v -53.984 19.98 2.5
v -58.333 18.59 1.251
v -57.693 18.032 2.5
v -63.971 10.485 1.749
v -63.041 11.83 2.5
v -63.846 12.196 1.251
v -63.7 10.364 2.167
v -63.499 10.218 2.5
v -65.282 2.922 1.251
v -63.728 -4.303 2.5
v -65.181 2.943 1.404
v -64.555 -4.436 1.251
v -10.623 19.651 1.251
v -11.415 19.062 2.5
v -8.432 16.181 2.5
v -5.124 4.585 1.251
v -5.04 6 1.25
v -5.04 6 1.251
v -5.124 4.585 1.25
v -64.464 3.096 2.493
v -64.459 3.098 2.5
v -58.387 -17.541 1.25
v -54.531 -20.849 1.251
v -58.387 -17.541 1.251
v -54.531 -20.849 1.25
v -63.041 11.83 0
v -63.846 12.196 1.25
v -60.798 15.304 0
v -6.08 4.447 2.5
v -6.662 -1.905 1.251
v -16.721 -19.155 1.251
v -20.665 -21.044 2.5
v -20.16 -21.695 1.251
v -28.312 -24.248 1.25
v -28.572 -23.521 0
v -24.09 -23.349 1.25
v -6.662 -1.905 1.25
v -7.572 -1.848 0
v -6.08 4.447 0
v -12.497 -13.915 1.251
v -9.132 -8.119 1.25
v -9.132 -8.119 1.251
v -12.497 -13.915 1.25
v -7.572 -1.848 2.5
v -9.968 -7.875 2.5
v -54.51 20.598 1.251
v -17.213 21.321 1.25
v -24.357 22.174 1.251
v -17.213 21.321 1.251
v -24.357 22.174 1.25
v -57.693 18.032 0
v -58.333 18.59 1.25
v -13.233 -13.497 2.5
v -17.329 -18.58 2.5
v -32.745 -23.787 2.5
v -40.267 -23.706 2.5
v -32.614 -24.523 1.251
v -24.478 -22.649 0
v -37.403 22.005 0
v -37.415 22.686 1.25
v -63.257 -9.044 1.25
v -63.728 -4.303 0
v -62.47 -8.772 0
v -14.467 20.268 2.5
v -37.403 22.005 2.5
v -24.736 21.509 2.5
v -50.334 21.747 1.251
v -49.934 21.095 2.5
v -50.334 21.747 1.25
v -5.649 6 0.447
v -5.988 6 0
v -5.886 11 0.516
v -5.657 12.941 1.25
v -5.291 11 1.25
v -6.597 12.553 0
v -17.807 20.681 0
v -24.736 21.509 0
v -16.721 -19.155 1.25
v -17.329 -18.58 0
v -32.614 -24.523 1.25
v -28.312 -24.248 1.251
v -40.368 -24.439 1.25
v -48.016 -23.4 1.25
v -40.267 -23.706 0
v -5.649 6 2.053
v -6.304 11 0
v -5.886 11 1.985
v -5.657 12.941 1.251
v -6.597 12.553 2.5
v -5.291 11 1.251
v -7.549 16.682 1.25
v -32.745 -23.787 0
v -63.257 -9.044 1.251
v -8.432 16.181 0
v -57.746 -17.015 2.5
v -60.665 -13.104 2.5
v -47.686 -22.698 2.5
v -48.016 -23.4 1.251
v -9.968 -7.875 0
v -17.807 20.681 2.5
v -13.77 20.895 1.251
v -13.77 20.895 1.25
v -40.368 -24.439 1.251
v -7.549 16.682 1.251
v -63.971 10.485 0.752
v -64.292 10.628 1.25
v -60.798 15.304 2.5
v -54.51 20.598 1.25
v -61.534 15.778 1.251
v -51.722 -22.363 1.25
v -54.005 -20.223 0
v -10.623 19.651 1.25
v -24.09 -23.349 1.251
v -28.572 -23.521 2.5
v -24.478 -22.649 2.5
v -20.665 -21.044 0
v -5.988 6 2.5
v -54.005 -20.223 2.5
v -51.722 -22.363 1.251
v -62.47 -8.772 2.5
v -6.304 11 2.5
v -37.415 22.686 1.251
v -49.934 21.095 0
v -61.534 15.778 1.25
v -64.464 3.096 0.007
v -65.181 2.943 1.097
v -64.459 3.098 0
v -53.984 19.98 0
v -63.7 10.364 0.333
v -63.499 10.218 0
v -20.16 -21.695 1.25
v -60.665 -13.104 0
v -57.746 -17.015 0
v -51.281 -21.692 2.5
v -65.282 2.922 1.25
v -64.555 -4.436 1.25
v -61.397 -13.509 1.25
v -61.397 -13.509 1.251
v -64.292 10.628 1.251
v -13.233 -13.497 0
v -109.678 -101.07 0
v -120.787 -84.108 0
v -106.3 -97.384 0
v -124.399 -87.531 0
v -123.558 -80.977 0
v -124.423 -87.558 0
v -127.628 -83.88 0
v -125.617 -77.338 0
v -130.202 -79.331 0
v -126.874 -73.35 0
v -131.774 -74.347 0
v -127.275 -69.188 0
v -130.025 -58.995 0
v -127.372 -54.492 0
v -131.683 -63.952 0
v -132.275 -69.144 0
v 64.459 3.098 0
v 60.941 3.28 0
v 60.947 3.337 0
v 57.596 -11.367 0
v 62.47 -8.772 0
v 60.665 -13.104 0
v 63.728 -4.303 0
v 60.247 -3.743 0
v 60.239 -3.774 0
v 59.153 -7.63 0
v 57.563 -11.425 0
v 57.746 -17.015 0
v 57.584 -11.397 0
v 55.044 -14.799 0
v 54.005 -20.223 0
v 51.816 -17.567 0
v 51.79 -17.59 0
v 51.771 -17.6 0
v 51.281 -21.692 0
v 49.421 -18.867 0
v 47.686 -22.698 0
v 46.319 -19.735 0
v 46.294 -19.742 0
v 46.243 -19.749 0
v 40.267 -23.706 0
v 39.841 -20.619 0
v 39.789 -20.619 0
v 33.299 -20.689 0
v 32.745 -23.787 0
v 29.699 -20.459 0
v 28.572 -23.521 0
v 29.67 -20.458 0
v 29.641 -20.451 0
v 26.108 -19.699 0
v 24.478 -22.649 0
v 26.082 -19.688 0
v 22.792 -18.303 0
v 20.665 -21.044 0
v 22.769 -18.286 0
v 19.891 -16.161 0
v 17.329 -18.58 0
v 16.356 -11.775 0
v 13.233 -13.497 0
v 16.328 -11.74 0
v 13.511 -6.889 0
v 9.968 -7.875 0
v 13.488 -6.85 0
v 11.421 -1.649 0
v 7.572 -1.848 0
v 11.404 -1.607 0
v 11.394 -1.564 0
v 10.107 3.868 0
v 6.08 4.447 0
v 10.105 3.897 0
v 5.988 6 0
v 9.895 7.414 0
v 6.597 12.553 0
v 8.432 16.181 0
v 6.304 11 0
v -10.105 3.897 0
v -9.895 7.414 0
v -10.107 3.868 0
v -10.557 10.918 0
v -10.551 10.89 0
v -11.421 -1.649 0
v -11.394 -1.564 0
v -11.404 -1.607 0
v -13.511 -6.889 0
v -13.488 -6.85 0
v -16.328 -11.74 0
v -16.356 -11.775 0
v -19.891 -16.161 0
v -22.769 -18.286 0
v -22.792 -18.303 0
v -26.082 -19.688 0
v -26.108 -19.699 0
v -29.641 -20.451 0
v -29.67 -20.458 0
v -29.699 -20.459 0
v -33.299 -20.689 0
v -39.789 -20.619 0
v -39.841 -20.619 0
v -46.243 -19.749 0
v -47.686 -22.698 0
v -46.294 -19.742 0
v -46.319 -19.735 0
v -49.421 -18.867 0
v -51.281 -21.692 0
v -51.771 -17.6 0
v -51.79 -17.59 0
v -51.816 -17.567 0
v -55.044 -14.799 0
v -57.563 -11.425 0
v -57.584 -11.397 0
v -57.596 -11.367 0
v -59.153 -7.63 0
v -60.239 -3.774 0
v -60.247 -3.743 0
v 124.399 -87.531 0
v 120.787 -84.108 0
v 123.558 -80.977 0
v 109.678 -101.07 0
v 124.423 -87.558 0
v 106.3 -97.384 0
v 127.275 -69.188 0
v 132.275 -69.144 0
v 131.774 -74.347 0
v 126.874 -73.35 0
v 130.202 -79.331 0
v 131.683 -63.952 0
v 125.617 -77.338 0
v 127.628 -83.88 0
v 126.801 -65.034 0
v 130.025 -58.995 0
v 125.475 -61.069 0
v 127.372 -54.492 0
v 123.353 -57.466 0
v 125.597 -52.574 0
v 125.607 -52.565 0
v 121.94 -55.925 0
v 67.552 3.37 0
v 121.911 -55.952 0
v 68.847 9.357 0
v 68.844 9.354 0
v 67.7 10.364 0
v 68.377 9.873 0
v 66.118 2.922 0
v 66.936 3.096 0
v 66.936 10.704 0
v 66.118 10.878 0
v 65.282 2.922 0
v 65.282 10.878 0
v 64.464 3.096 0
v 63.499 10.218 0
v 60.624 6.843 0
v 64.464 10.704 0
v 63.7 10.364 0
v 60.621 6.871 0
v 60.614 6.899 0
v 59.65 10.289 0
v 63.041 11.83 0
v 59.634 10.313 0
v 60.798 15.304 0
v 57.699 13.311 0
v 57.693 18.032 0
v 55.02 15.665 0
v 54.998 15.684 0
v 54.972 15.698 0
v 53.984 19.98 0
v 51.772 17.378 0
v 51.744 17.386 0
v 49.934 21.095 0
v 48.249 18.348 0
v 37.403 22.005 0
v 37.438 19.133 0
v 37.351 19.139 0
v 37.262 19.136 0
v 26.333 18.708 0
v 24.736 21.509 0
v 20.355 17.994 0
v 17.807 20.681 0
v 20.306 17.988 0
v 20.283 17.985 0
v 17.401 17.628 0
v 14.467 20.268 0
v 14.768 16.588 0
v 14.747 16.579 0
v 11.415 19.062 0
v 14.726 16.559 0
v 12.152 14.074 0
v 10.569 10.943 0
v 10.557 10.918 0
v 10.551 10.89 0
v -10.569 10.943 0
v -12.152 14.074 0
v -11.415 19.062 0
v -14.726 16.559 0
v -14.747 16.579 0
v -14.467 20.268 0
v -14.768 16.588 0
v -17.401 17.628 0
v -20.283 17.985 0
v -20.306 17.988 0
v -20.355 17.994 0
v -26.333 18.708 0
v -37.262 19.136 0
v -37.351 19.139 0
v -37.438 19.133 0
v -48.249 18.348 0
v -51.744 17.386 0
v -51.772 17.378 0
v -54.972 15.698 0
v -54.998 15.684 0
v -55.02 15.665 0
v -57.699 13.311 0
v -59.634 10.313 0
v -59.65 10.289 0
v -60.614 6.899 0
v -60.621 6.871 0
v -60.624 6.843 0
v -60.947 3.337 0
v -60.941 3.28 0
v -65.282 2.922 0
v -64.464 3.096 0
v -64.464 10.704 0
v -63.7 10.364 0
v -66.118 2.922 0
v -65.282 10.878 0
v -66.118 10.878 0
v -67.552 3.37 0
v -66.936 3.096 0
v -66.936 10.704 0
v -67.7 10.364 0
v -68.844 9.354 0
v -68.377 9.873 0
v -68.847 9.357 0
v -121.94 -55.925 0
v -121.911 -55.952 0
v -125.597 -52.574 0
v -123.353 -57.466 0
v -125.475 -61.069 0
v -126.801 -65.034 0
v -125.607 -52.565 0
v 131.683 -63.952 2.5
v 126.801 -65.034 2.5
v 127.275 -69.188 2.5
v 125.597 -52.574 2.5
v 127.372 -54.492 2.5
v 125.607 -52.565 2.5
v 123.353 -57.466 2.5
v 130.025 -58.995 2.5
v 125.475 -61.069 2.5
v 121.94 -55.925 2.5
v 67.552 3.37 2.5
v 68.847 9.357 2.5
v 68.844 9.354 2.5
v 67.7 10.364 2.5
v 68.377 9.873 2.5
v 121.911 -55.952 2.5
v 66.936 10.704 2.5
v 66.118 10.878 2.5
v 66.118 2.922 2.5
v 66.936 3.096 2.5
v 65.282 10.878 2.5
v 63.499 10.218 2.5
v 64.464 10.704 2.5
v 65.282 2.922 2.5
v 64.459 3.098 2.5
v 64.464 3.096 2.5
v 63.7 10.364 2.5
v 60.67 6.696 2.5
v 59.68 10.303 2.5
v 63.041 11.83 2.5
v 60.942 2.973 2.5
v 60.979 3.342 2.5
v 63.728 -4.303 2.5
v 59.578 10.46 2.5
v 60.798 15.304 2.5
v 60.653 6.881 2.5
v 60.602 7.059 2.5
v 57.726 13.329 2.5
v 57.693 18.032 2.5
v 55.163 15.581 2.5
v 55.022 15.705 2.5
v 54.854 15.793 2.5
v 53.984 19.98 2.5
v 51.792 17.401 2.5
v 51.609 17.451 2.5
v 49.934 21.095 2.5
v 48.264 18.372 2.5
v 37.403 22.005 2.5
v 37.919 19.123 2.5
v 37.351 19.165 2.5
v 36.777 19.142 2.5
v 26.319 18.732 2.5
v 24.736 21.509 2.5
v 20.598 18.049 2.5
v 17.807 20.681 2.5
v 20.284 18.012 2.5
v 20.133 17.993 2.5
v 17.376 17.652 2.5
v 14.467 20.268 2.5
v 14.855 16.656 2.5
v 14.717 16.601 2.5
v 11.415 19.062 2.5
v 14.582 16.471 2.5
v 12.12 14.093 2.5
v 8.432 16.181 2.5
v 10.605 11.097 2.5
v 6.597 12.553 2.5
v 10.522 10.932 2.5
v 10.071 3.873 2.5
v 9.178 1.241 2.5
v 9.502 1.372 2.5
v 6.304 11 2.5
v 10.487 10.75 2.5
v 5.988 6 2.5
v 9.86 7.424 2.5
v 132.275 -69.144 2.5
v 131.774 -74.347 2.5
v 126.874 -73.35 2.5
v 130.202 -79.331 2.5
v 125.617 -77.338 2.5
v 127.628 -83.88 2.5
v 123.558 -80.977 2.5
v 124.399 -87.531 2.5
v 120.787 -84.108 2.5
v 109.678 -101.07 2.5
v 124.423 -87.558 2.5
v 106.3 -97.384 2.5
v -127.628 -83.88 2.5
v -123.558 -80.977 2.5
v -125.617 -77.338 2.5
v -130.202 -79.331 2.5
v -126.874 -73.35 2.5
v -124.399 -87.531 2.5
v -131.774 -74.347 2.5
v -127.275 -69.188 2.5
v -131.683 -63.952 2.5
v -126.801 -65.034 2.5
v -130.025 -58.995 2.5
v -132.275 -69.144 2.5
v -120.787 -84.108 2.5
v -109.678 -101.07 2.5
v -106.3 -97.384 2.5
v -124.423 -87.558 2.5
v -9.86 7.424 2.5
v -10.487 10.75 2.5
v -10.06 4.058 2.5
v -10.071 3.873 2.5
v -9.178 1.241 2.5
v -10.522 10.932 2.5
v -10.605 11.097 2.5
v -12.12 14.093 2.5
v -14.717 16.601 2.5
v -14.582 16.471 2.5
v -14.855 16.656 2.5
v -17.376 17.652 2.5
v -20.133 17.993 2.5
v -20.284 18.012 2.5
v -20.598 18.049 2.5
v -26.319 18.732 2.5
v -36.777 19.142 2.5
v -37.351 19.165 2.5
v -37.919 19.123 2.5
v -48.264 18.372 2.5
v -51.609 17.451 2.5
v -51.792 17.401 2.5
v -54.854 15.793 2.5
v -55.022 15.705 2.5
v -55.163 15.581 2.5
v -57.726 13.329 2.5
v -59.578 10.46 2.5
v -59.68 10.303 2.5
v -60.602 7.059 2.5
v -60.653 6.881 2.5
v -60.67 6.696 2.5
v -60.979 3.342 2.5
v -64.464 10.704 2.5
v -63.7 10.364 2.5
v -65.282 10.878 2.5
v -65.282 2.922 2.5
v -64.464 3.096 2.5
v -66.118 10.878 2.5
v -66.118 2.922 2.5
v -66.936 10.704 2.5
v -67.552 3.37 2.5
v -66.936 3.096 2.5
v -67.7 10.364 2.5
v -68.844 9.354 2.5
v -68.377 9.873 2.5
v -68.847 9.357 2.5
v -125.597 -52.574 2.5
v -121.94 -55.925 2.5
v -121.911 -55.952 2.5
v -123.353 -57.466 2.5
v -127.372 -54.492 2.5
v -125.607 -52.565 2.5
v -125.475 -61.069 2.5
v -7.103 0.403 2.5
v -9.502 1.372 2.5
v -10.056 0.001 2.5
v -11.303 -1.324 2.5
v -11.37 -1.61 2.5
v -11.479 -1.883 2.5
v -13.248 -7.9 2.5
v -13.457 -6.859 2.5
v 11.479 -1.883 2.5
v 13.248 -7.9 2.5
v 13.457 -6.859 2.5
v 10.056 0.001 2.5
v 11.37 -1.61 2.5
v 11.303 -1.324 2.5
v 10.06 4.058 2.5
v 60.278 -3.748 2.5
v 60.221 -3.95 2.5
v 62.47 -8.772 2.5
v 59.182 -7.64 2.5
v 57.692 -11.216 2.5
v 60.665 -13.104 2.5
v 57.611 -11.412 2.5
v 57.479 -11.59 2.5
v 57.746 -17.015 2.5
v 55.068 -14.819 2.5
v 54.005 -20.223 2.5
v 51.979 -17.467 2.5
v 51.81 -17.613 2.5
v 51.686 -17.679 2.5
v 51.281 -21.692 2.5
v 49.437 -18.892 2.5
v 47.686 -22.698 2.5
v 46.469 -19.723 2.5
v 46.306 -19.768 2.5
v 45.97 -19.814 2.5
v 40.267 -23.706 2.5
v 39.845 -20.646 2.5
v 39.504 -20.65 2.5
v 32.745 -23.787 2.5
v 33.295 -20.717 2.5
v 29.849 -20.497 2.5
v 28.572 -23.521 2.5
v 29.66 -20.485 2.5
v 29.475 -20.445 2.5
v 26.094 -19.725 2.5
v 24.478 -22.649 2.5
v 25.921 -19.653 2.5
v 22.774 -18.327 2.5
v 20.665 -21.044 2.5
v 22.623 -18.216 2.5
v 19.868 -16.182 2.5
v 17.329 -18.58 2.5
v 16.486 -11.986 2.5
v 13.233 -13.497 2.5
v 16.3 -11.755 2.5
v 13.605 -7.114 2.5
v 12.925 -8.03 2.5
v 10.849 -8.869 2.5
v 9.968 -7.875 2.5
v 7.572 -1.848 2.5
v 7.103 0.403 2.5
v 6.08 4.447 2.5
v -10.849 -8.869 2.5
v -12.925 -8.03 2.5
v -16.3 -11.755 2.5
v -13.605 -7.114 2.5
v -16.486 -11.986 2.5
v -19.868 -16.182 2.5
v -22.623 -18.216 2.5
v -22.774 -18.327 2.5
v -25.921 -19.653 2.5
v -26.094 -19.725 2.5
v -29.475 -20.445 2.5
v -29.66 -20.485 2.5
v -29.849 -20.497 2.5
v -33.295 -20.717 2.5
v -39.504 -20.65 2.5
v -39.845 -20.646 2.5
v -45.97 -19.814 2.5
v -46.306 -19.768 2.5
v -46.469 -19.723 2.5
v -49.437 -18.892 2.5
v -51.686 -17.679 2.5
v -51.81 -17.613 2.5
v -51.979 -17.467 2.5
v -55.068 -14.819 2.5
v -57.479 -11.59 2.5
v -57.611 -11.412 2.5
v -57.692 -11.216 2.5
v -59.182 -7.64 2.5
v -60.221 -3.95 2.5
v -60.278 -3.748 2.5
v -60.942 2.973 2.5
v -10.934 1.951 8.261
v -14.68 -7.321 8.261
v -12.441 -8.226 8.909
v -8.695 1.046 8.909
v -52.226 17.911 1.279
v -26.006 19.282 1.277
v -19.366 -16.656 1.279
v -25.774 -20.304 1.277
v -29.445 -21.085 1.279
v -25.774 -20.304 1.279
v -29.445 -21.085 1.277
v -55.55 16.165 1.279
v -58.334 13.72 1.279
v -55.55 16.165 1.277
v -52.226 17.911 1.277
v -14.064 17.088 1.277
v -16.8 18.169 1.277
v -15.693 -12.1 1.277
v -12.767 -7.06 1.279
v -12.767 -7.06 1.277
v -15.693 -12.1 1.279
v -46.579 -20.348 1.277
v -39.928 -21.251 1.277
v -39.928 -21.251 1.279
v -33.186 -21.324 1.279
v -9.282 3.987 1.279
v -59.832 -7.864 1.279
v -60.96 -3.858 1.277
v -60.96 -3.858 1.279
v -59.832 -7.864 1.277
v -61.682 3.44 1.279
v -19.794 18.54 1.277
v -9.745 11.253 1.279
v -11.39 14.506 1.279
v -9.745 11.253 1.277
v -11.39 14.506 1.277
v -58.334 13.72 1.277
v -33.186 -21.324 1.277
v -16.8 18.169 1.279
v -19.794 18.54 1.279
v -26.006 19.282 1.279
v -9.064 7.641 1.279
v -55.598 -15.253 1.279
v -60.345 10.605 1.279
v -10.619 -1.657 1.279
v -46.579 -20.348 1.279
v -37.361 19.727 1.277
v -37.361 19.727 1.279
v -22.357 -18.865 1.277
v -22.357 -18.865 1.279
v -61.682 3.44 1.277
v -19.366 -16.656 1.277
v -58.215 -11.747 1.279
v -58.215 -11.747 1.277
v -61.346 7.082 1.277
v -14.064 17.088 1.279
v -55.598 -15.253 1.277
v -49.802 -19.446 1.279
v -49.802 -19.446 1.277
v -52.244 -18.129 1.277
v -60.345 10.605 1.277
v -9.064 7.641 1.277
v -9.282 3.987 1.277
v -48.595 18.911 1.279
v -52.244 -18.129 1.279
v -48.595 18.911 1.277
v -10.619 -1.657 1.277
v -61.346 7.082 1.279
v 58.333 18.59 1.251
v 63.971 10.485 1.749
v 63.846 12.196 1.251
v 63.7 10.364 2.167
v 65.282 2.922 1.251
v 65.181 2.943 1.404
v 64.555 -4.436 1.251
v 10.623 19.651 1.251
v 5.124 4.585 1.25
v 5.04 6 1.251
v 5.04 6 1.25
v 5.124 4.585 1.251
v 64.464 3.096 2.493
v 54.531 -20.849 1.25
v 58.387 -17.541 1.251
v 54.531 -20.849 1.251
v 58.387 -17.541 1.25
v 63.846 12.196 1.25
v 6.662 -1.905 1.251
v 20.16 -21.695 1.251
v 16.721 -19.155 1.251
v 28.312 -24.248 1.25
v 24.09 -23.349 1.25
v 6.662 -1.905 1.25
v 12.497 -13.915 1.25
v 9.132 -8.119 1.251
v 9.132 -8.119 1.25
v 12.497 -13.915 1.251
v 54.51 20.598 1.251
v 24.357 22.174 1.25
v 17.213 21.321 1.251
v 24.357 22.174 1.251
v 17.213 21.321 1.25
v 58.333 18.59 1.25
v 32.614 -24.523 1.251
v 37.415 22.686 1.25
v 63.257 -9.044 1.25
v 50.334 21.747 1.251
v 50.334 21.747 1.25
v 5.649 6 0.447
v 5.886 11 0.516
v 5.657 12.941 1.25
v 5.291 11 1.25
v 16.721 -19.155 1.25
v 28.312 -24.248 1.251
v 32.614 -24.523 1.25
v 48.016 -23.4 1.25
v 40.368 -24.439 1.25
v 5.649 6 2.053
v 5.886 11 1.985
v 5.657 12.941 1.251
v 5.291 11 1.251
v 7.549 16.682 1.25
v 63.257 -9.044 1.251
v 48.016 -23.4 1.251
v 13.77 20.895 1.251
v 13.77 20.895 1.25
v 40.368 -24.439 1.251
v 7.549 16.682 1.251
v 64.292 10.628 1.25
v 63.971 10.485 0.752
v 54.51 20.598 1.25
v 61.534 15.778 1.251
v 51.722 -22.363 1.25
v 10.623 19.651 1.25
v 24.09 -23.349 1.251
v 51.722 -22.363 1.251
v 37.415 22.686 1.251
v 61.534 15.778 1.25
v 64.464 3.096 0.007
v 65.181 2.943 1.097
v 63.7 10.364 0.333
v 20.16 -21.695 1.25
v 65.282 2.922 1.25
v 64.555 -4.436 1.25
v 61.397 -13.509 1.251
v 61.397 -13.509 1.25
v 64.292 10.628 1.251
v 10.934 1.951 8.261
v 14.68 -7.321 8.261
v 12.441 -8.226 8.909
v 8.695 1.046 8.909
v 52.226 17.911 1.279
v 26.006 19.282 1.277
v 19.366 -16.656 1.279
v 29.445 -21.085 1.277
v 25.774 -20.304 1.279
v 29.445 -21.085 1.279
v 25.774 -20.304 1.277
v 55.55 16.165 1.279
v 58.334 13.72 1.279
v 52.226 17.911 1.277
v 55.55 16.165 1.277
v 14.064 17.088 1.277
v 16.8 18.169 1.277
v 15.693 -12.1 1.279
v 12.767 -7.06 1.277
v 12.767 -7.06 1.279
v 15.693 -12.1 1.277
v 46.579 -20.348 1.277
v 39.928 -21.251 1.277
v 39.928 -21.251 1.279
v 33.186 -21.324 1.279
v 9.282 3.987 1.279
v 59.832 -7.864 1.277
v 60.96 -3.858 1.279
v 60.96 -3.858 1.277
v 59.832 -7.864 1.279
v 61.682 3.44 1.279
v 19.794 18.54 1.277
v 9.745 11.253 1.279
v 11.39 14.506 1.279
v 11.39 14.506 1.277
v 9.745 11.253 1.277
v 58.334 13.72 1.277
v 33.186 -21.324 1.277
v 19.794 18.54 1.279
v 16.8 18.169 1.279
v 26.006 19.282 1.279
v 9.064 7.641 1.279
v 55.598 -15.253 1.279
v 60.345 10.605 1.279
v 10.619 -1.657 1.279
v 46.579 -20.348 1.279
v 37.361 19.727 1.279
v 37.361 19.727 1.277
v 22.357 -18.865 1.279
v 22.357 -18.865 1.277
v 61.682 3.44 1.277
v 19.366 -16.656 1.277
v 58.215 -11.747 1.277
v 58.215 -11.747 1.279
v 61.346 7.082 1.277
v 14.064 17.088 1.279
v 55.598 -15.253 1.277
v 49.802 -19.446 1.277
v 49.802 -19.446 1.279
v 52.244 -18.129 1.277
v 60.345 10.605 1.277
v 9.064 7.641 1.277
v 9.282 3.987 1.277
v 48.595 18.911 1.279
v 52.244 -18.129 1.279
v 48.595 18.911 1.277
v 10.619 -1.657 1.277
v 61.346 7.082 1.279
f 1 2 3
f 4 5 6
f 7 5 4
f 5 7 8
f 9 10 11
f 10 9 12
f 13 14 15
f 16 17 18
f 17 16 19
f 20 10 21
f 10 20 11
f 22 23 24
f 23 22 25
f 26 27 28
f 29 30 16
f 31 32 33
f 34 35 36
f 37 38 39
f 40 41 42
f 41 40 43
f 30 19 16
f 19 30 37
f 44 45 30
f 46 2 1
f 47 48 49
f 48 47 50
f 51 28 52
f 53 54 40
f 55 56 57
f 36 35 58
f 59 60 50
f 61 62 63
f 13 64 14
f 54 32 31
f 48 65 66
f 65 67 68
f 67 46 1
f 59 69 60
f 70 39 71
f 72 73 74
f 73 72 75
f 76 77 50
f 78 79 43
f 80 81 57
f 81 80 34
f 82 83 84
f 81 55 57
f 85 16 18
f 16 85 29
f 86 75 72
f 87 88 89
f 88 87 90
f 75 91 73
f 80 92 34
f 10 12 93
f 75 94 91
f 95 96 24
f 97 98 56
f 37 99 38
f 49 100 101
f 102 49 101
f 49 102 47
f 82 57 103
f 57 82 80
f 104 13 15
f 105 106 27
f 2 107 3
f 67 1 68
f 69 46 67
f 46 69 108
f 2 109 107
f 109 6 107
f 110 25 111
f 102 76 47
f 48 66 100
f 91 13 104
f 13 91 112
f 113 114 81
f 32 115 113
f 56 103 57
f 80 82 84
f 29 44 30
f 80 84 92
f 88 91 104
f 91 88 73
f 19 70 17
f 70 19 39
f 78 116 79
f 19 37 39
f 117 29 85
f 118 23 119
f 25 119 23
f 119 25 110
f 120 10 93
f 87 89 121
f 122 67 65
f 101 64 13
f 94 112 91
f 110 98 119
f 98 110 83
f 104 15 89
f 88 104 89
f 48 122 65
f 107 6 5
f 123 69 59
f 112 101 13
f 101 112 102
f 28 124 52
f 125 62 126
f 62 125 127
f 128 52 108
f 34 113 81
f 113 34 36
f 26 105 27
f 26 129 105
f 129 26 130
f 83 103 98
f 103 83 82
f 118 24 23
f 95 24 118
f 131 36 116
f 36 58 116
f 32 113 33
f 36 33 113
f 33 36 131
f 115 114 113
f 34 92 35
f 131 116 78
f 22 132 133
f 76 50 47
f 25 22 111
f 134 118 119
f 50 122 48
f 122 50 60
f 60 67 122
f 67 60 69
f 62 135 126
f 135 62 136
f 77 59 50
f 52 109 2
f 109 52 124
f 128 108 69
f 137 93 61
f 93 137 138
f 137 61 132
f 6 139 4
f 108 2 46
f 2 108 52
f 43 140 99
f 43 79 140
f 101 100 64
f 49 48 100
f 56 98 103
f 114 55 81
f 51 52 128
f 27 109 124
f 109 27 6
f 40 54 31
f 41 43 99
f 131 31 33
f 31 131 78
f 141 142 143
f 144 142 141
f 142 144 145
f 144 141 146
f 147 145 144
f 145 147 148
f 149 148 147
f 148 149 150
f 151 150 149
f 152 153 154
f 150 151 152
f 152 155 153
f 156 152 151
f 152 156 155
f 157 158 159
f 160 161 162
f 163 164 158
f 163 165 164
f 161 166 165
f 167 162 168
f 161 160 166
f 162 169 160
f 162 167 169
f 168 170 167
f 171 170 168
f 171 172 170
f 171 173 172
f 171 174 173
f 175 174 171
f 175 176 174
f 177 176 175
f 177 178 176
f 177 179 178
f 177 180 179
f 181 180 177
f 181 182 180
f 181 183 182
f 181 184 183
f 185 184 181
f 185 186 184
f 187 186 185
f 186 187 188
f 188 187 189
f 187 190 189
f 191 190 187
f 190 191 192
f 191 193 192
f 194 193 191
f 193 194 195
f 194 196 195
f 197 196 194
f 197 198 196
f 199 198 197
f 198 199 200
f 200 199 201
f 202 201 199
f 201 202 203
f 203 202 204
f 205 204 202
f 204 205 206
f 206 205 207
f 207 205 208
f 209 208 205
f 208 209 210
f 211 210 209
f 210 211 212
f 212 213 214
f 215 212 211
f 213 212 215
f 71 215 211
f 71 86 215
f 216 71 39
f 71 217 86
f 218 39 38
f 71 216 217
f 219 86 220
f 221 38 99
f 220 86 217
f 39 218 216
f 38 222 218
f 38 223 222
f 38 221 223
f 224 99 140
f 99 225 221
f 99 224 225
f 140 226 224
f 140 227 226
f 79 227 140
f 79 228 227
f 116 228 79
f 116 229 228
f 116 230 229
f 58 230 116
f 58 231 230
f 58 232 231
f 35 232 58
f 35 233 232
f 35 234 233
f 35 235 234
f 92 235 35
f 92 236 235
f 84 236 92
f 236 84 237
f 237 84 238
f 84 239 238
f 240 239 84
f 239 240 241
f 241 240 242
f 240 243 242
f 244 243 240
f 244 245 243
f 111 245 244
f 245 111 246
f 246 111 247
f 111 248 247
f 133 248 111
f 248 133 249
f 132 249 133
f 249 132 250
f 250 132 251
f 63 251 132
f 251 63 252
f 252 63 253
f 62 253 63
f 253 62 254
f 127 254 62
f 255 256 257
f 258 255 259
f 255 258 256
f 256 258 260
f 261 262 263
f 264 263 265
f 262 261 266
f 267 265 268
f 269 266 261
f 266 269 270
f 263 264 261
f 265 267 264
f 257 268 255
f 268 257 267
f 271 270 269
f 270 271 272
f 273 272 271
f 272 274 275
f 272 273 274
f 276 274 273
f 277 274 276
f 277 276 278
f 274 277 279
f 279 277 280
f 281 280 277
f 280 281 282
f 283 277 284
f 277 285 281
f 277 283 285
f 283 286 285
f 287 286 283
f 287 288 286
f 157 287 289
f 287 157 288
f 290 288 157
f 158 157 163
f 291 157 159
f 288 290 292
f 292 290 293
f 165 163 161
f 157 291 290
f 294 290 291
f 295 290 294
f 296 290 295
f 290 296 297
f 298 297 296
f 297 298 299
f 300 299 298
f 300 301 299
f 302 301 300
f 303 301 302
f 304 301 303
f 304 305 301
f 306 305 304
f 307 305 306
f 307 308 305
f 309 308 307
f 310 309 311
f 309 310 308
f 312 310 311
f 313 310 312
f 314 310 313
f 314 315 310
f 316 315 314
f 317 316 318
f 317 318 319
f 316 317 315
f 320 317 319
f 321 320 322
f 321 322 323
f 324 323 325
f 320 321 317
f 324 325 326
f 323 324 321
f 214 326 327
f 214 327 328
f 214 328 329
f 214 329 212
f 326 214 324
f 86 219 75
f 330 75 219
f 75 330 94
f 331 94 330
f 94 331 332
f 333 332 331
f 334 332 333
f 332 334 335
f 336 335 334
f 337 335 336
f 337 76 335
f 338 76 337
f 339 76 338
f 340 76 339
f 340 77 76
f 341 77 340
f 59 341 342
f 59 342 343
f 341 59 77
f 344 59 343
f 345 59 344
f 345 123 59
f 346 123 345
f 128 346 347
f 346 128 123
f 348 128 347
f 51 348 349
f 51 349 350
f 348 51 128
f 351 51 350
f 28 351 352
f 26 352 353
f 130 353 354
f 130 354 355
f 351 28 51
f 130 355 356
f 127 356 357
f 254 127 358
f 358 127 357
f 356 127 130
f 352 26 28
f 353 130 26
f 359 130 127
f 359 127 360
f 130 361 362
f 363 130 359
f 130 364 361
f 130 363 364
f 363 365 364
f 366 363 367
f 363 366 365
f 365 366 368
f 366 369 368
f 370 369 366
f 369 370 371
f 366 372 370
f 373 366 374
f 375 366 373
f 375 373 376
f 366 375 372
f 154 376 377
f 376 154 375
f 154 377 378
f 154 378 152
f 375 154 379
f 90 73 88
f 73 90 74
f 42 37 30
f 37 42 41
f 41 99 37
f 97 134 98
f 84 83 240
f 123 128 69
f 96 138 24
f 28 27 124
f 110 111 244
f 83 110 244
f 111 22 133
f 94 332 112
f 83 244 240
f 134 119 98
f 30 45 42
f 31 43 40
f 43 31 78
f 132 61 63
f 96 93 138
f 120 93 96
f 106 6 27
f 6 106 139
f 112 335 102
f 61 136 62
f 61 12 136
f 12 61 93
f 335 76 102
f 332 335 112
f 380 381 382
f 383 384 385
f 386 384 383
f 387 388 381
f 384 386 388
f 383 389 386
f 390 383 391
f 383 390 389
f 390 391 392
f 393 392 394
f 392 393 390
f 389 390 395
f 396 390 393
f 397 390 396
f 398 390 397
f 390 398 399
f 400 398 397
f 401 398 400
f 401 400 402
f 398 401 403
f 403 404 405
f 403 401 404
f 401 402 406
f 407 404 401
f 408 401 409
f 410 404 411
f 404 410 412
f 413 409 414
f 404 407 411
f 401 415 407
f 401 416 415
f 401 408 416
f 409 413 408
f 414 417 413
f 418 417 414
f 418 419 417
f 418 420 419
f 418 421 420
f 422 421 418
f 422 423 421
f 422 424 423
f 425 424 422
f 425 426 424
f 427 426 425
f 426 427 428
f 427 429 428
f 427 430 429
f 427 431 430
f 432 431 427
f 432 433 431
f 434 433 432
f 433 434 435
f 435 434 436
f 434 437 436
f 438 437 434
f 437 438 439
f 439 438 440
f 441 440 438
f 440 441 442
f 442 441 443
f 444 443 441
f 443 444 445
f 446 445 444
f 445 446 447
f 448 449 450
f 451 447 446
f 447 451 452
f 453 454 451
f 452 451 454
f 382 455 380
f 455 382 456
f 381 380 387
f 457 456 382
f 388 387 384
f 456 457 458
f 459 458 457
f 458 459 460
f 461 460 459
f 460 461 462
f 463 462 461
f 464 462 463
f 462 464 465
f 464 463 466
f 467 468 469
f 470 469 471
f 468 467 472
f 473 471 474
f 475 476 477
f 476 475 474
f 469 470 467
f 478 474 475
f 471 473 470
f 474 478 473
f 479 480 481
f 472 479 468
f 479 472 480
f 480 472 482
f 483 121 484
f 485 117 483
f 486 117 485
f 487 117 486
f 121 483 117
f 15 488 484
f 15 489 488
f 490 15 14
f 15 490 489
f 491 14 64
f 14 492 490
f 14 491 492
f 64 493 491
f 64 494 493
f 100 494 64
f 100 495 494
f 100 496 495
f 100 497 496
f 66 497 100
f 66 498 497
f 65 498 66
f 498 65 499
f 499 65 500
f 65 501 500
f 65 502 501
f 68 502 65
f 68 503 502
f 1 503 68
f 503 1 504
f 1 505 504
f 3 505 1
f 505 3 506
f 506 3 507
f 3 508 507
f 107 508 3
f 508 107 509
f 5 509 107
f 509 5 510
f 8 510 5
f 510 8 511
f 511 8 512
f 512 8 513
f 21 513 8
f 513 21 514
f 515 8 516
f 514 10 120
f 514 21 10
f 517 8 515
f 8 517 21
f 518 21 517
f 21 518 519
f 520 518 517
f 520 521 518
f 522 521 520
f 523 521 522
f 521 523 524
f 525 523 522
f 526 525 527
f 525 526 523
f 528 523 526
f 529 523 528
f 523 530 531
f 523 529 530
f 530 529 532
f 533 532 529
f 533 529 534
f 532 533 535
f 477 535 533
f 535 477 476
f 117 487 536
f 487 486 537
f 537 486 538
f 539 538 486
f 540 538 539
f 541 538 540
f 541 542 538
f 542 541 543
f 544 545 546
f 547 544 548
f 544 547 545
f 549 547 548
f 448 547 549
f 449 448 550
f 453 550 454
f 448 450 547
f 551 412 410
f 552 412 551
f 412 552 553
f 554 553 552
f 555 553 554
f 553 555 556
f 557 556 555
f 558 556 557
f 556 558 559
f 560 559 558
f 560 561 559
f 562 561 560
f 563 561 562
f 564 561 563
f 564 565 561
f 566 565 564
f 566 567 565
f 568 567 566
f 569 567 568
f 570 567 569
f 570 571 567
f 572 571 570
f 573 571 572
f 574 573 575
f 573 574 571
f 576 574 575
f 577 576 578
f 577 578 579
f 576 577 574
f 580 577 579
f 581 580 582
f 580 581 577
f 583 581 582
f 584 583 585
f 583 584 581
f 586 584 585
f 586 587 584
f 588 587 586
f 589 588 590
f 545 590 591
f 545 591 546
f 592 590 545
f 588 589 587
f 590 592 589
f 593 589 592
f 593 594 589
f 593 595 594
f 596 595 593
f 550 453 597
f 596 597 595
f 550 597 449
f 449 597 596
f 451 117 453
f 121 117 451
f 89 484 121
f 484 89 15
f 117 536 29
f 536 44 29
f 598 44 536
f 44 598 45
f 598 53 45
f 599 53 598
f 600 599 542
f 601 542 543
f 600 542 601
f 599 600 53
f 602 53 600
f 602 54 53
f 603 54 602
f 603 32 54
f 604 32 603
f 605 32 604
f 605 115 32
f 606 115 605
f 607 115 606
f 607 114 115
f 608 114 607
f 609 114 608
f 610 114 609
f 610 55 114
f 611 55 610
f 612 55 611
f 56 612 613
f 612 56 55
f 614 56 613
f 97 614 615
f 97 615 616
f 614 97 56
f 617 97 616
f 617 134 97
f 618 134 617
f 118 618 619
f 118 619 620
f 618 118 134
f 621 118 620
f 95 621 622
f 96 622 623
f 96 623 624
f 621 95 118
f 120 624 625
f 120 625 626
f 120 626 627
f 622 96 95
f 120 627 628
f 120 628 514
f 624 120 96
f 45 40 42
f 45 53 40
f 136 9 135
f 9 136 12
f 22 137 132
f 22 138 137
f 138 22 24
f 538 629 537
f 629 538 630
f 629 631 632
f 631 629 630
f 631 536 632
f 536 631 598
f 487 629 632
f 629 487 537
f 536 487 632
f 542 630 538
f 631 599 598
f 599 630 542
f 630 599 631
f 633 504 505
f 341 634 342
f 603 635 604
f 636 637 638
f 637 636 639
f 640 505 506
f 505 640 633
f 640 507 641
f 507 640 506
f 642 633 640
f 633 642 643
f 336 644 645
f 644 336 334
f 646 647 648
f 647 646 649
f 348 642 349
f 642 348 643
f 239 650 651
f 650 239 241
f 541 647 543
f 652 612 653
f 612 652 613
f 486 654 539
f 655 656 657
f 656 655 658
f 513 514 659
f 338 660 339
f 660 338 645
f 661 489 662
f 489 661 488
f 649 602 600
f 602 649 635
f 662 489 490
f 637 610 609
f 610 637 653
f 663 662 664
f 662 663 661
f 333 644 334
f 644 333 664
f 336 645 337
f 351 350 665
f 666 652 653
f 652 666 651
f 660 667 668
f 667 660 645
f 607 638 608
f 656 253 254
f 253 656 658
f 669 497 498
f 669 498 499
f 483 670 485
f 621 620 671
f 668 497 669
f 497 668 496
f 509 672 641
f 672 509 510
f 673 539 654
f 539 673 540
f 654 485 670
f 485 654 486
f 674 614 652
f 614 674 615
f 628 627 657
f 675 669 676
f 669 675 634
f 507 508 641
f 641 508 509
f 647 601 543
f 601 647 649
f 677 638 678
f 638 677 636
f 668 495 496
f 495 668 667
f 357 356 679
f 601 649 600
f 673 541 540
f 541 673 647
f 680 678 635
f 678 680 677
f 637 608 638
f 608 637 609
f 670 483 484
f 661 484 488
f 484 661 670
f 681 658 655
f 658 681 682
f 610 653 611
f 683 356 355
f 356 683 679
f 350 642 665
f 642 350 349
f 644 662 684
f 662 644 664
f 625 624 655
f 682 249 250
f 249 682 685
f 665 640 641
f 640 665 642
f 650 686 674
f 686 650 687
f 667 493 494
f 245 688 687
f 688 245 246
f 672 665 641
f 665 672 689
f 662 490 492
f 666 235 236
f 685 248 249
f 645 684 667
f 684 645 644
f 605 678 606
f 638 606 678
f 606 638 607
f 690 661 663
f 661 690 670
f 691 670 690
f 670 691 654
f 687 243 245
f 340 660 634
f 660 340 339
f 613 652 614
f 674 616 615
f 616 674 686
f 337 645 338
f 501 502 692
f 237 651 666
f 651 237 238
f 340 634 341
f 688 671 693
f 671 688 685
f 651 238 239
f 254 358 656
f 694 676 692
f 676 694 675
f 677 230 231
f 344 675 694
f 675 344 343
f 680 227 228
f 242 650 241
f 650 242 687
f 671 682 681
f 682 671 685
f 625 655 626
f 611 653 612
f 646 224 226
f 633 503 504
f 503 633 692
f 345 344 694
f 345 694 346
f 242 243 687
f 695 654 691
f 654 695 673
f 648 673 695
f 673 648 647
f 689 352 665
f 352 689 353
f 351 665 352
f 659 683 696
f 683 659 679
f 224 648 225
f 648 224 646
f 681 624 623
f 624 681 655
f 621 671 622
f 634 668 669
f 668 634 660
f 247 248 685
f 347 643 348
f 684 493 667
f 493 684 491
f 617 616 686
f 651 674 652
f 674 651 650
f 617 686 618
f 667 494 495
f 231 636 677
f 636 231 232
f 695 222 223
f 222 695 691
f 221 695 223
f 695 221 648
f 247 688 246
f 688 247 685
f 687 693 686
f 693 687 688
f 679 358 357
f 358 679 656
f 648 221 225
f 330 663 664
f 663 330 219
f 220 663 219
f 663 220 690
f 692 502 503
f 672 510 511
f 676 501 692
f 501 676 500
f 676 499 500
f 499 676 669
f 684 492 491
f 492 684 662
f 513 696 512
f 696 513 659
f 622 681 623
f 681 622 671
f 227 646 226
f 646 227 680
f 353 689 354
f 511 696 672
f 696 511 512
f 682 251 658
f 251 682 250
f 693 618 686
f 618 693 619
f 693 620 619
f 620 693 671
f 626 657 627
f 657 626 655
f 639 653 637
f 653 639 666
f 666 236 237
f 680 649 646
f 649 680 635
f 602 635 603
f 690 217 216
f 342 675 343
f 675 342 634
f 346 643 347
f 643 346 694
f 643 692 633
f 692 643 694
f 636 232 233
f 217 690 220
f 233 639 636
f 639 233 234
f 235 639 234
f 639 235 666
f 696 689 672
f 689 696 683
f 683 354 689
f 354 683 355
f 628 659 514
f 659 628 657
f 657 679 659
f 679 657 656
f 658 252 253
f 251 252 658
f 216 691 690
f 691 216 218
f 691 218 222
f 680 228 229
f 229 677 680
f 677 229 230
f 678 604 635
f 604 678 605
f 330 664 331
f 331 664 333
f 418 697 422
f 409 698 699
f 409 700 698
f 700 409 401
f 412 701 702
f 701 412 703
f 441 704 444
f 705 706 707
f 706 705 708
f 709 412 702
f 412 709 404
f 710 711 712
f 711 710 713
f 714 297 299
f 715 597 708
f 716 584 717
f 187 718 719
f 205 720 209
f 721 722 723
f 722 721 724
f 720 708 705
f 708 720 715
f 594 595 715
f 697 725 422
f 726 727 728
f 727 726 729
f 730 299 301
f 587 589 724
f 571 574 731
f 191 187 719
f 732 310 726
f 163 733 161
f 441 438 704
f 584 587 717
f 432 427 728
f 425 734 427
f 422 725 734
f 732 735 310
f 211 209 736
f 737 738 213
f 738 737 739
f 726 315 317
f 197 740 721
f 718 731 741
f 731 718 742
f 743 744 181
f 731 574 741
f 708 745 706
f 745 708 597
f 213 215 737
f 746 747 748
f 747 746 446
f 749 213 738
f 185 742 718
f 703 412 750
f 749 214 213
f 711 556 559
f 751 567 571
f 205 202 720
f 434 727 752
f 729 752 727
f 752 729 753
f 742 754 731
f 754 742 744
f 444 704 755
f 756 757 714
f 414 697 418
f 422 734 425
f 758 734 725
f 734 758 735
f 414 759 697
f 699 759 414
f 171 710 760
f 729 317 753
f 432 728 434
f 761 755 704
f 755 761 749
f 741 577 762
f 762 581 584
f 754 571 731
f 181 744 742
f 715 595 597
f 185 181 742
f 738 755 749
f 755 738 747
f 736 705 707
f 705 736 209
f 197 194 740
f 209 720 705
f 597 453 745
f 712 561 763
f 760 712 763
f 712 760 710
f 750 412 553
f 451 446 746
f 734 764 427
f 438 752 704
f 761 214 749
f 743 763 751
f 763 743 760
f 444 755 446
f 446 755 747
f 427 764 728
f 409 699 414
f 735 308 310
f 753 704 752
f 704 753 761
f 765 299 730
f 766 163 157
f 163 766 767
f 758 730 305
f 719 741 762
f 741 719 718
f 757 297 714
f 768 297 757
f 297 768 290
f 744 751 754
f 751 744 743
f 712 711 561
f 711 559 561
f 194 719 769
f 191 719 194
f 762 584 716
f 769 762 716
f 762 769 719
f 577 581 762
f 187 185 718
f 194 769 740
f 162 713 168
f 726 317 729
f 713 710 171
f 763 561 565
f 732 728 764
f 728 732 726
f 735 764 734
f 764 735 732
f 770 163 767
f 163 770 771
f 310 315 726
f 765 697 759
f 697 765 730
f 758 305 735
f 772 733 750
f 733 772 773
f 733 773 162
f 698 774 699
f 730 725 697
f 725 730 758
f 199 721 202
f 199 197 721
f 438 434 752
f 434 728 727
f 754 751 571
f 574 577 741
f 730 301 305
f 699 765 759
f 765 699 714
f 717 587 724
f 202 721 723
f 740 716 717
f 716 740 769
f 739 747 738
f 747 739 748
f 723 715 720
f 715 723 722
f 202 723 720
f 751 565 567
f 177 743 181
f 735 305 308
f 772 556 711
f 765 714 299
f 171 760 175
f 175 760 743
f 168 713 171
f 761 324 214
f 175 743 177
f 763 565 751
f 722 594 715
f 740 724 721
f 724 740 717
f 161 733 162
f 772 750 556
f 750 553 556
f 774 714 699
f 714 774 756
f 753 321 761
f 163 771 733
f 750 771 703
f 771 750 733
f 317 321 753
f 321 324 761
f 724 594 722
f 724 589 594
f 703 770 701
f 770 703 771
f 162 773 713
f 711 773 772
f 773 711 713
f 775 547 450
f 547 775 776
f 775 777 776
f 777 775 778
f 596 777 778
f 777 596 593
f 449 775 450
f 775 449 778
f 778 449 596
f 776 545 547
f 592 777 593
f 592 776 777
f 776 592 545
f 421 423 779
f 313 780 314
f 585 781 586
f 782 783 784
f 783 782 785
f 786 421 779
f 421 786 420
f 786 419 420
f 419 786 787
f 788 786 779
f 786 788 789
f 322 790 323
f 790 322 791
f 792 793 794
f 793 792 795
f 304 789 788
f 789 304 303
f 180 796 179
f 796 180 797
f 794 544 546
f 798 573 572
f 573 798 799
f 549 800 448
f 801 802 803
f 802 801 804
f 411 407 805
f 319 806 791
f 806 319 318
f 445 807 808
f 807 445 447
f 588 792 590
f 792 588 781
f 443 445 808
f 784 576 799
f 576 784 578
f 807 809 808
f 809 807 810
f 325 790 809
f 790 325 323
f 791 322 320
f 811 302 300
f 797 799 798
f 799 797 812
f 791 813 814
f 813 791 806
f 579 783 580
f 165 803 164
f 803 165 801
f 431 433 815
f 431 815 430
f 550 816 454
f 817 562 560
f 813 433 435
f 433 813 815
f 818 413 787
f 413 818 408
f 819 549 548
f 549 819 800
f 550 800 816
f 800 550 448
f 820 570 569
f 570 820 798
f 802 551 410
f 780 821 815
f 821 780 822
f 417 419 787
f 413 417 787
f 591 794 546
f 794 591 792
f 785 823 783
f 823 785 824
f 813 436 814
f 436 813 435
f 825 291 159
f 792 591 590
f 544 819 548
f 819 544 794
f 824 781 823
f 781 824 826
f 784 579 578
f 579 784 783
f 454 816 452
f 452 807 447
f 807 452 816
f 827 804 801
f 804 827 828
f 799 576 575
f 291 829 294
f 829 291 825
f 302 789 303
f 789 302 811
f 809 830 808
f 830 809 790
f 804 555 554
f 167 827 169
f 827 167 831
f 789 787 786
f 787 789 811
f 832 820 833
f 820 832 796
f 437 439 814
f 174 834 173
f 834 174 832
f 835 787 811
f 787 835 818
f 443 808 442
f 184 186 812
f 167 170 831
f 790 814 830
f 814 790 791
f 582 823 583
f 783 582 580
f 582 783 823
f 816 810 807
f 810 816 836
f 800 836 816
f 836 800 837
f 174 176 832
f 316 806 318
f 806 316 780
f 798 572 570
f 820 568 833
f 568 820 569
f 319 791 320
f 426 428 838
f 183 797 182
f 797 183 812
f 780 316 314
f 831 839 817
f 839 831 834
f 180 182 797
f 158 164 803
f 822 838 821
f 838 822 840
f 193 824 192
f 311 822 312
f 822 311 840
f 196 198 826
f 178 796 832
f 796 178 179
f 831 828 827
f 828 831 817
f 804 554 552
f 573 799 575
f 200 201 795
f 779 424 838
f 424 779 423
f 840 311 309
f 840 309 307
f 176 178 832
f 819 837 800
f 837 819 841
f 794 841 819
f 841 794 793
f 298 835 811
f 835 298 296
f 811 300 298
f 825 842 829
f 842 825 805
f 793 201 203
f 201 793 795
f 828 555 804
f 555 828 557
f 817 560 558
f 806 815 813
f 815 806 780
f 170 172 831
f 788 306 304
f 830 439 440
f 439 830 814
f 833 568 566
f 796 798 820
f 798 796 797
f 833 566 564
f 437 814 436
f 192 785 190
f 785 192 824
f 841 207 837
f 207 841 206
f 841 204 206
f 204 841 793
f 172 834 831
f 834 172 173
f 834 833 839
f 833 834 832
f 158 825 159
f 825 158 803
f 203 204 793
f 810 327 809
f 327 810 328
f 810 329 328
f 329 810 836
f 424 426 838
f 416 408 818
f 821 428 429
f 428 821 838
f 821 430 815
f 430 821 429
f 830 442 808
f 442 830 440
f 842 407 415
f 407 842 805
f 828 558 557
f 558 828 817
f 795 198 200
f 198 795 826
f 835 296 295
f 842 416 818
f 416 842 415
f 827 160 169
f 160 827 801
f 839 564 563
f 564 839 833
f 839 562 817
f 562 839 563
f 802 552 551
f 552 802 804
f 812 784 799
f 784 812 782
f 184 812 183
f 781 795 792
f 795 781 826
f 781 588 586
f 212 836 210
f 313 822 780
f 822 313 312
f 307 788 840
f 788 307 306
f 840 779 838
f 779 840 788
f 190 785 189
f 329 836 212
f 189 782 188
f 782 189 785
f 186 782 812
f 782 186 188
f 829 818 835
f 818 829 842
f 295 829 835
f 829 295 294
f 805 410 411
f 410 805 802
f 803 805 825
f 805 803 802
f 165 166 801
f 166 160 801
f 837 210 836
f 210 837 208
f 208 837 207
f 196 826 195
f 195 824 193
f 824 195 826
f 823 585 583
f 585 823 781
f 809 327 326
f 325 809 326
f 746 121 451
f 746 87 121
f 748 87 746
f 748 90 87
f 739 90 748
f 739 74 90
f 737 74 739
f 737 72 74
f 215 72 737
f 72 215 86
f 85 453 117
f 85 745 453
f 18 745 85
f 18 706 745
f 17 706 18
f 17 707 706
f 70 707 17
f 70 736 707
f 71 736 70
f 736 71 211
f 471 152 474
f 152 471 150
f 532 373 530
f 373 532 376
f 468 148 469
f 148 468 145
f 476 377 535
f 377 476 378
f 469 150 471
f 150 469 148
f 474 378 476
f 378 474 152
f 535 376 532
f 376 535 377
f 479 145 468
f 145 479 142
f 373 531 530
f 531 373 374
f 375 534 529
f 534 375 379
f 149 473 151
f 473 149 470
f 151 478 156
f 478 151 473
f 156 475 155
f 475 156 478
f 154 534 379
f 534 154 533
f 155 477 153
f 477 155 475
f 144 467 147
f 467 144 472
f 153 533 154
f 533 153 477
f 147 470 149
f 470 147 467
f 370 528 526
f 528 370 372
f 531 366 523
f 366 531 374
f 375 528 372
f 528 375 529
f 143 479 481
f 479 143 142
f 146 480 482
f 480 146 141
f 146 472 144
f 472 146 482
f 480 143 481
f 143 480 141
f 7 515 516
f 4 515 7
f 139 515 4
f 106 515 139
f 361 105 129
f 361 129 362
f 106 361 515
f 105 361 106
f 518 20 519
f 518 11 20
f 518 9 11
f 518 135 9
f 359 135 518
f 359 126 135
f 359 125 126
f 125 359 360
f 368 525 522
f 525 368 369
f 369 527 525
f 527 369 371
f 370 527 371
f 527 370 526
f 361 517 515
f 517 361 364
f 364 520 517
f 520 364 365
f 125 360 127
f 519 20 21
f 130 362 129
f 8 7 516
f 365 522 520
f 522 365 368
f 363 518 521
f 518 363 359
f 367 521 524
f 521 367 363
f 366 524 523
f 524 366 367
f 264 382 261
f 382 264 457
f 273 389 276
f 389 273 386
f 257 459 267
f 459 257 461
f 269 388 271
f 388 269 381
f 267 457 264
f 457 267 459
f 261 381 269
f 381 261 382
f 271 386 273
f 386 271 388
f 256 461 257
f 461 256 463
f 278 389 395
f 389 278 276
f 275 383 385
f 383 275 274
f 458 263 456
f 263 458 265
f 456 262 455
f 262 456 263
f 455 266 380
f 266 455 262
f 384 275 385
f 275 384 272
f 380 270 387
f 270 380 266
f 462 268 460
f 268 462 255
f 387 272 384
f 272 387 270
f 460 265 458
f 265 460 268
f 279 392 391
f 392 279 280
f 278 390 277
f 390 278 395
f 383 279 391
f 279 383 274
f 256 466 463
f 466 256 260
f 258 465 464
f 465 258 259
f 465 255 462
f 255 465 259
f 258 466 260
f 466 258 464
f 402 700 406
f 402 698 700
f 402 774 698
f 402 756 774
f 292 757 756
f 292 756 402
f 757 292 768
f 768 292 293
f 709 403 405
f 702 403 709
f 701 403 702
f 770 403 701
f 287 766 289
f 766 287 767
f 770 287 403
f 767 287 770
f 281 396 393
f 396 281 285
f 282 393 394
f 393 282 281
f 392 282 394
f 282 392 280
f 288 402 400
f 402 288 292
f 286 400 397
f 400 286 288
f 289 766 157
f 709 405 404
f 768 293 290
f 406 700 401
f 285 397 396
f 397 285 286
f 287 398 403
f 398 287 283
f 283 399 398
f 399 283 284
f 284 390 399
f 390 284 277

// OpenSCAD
// file: ../../gospel.scad
/**
 * GOSPEL: George's OpenSCAD Procedural Enhancement Library
 * @author glaza
 *
 * Index:
 *      Translation: x, y, z, xy, xz, yz, xyz (displacement, variation)
 *      Scaling:     sx, sy, sz, sxy, sxz, syz, s (factor, variation)
 *      Rotation:    rx, ry, rz (angle, variation)
 *      Duplication: dx, dy, dz ()
 */
use <3rd_party/threads-library-by-cuiso-v1.scad>

/**
 * Translates the children in the X,Y,Z direction
 * @param d Displacement in X,Y,Z direction
 * @param variation The random variation + or - added to the displacement * 
 *  x      Translate X
 *  y      Translate Y
 *  z      Translate Z
 *  xy     Translate equaly in X and Y
 *  xz     Translate equaly in X and Z
 *  yz     Translate equaly in Y and Z
 *  xyz    Translate equaly in X, Y and Z
 */
function rand(value, variation=0) = value + rands(-variation,variation,1)[0]; 
 
module x(dx, variation=0) 
{   
    vx = rands(-variation,variation,1)[0];
    translate([dx+vx,0,0])
    children();
}
module y(dy, variation=0) 
{   
    vy = rands(-variation,variation,1)[0];
    translate([0,dy+vy,0])
    children();
} 
module z(dz, variation=0) 
{   
    vz = rands(-variation,variation,1)[0];
    translate([0,0,dz+vz])
    children();
}
module xy(d, variation=0) 
{   
    x(d, variation)
    y(d, variation)
    children();
}
module yz(d, variation=0) 
{   
    z(d, variation)
    y(d, variation)
    children();
}
module xz(d, variation=0) 
{   
    x(d, variation)
    z(d, variation)
    children();
}
module xyz(d, variation=0) 
{   
    xy(d, variation)
    z(d, variation)
    children();
}

/**
 * Rotates the children around the X axis
 * @param angle Degrees to rotate around the X axis
 * @param variation The random variation + or - added
 *  rx     Rotate around X
 *  ry     Rotate around Y
 *  rz     Rotate around Z
 */
module rx(angle, variation=0) 
{   
    v = rands(-variation,variation,1)[0];
    rotate([angle+v,0,0])
    children();
}
module ry(angle, variation=0) 
{   
    v = rands(-variation,variation,1)[0];
    rotate([0,angle+v,0])
    children();
}
module rz(angle, variation=0) 
{   
    v = rands(-variation,variation,1)[0];
    rotate([0,0,angle+v])
    children();
}

/**
 * Duplicates the children across the different planes.
 *      dx: YZ plane, dy: XZ plane, dz: XY plane
 */
module dx() 
{
    mirror([1,0,0])
    children();

    children();
}
module dy() 
{
    mirror([0,1,0])
    children();

    children();
}
module dz() 
{
    mirror([0,0,1])
    children();

    children();
}

/**
 * Mirrors across diferent planes.
 *      mx: YZ plane, my: XZ plane, mz: XY plane
 */
module mx() 
{
    mirror([1,0,0])
    children();
}
module my() 
{
    mirror([0,1,0])
    children();
}
module mz() 
{
    mirror([0,0,1])
    children();
}

/**
 * Scales in different directions
 *      mx: YZ plane, my: XZ plane, mz: XY plane
 */
module sx(factor, variation=0) 
{
    scaleFactor = rand(factor, variation);
    scale([scaleFactor,1,1])
    children();
}
module sy(factor, variation=0) 
{
    scaleFactor = rand(factor, variation);
    scale([1,scaleFactor,1])
    children();
}
module sz(factor, variation=0) 
{
    scaleFactor = rand(factor, variation);
    scale([1,1,scaleFactor])
    children();
}
module sxy(factor, variation=0) 
{
    sx(factor, variation)
    sy(factor, variation)
    children();
}
module syz(factor, variation=0) 
{
    sz(factor, variation)
    sy(factor, variation)
    children();
}
module sxz(factor, variation=0) 
{   
    sx(factor, variation)
    sz(factor, variation)
    children();
}
module s(factor, variation=0) 
{   
    sxy(factor, variation)
    sz(factor, variation)
    children();
}

/**
 * Shortcuts
 */
module diff() //does not work
{
    difference()
    {
        children();
    }
}


/**
 * Colours
 */
module red()     { color("Red") children(); }
module blue()    { color("RoyalBlue") children(); }
module green()   { color("Green") children(); }
module black()   { color("Black") children(); }
module white()   { color("White") children(); }
module cyan()    { color("Cyan") children(); }
module magenta() { color("Magenta") children(); }
module yellow()  { color("Yellow") children(); }
module glass()   { color([0.5, 0.5, 1], 0.25) children(); }

/**
 * shapes
 * @param size A vector passed to the cube
 * @param r The radius of the sphere
 * @param half Whether all corners or only top ones
 */
module rounded(size, r, half)
{
    radius = half
        ? min(r, 0.999*min(size[0]/2, size[1]/2, size[2]))
        : min(r, 0.999*min(size)/2);
    
    diameter = 2*radius;
    width = size[0] - diameter;
    height = size[1] - diameter;
    depth = half 
        ? (size[2] - radius) 
        : size[2] - diameter;
    shift = half ? radius : 0; 
    
    intersection()
    {
        z(-shift)
        xyz(radius)
        minkowski()
        {
            sphere(radius);
            cube([width,height,depth]);
        }
        
        cube(size);
    }
}

module screw(d, h, center=false) {
    z(center ? -h : 0)
    thread_for_screw(diameter=d - 1, length=h);
}

module thread(d, h, center=false) {
    z(center ? -h : 0)
    thread_for_nut(diameter=d, length=h); 
}
// main file
include <../../gospel.scad>

frames();
mx() handle();
handle();

// Build plate
//color("grey") z(-5) y(-70) rz(45)
//cube([230, 230, 1], center=true);

module frames() {
    dist=14;

    bridge=dist+2;
    x(-bridge/2) y(6)
    cube([bridge, 5, 2.5]);

    distance=dist+23;
    x(-distance)
    frame();
    
    x(distance)
    mx()
    frame();
}

module handle() {
    x(-60) y(5) z(2.5)
    union() {
        
        y(-3.75) z(-2.5)
        union() {
            
            x(-5.7) y(5.65)
            cylinder(d=8, h=2.5, $fn=30);
            
            //rod
            rz(47.5)            
            union() {        
            
                y(7)
                mx()
                cube([84, 5, 2.5]);
                
                x(-84) y(-12.85)
                difference() {
                    cylinder(d=50, h=2.5);
                    z(-0.005) {
                        cylinder(d=40, h=3);
                        y(-25) cube([50,50,4]);
                        x(-25) y(-50) cube([50,50,4]);
                    }
                }
                
                x(-109) y(-32.5)
                cube([5,20,2.5]);
            }
        }        
    }
}

module frame_hinge() {
    x(-26) y(-2)
    cube([2, 10, 10]);
}

module frame() {
    difference() {
        union() {
            sxy(1.15) lens();
//            frame_hinge();
            blue() pad();
        }
        z(-0.01) sz(1.03)
        lens();
        //x(-30) y(7) cube([10, 1, 3]);
    }
}

module pad() {
    x(24) y(-8) z(1.5)
    rz(-22) {      
        ry(-15)
        cube([2.5, 10, 7]);
    }
}

module lens() hull() {
    sxy(0.97) sz(1.25)
    lens_shape();
    
    z(1.25)
    sz(0.001)
    lens_shape();

    z(1.25)
    sxy(0.97) sz(1.25)
    lens_shape();
}

module lens_shape() {
    linear_extrude(1)
    sxy(1.03)
    sx(1.48) sy(1.44)
    x(85) y(-122)
    polygon(
        points=
            [[-86.921, 107.672], [-91.284, 108.281], [-93.398, 108.889], [-95, 109.777], [-97.2, 111.716], [-98.917, 114.08], [-99.978, 116.698], [-100.718, 119.399], [-101.191, 124.319], [-100.971, 126.775], [-100.314, 129.15], [-98.995, 131.25], [-97.169, 132.899], [-94.988, 134.076], [-92.606, 134.75], [-88.946, 135], [-85.237, 135.3], [-81.508, 135], [-77.788, 135], [-73.713, 134.5], [-71.749, 134.25], [-69.954, 133.521], [-68.2, 131.78], [-67.121, 129.587], [-66.674, 127.152], [-66.817, 124.688], [-67.694, 120.883], [-69.103, 117.24], [-71.023, 113.842], [-73.432, 110.77], [-75.394, 109.281], [-77.636, 108.311], [-80.044, 107.784], [-82.498, 107.623]],
        paths=
            [[0, 1, 2, 3, 4, 5, 6, 7, 8, 9, 10, 11, 12, 13, 14, 15, 16, 17, 18, 19, 20, 21, 22, 23, 24, 25, 26, 27, 28, 29, 30, 31, 32, 33, 0, 0]]
    );
}

module lens_shape_measured() {
    linear_extrude(1) {
        x(-36) y(-27) z(0.5)
        hull() {
            polygon(points = [
                [30.45, 6.35],
                [17, 13.45],
                [13.65, 19.05],
                [12, 25.4],
                [11.8, 31.75],
                [13.7, 38.1],
                [22.4, 44.45],
                [39.39, 46.68],
                [57.7, 44.45],
                [62.7, 38.1],
                [63.12, 31.75],
                [61.58, 25.4],
                [59.3, 19.05],
                [55.4, 12.7],
                [43.2, 6.35],
                [37, 6.32]
            ]);

            x(1.5) y(0.8)
            rz(2)
            polygon(points = [
                [24.55, 5.27],
                [18.2, 8.36],
                [11.85, 24.4],
                [11.85, 30.6],
                [18.2, 41.47],
                [24.55, 43.51],
                [30.9, 44.47],
                [37.25, 45],
                [49.95, 44.18],
                [56.3, 42.7],
                [62.6, 32.77],
                [56.3, 13.85],
                [49.95, 6.7],
                [43.6, 4.44],
                [37.25, 3.8],
                [30.9, 4.13]    
            ]);
        }
    }
}
